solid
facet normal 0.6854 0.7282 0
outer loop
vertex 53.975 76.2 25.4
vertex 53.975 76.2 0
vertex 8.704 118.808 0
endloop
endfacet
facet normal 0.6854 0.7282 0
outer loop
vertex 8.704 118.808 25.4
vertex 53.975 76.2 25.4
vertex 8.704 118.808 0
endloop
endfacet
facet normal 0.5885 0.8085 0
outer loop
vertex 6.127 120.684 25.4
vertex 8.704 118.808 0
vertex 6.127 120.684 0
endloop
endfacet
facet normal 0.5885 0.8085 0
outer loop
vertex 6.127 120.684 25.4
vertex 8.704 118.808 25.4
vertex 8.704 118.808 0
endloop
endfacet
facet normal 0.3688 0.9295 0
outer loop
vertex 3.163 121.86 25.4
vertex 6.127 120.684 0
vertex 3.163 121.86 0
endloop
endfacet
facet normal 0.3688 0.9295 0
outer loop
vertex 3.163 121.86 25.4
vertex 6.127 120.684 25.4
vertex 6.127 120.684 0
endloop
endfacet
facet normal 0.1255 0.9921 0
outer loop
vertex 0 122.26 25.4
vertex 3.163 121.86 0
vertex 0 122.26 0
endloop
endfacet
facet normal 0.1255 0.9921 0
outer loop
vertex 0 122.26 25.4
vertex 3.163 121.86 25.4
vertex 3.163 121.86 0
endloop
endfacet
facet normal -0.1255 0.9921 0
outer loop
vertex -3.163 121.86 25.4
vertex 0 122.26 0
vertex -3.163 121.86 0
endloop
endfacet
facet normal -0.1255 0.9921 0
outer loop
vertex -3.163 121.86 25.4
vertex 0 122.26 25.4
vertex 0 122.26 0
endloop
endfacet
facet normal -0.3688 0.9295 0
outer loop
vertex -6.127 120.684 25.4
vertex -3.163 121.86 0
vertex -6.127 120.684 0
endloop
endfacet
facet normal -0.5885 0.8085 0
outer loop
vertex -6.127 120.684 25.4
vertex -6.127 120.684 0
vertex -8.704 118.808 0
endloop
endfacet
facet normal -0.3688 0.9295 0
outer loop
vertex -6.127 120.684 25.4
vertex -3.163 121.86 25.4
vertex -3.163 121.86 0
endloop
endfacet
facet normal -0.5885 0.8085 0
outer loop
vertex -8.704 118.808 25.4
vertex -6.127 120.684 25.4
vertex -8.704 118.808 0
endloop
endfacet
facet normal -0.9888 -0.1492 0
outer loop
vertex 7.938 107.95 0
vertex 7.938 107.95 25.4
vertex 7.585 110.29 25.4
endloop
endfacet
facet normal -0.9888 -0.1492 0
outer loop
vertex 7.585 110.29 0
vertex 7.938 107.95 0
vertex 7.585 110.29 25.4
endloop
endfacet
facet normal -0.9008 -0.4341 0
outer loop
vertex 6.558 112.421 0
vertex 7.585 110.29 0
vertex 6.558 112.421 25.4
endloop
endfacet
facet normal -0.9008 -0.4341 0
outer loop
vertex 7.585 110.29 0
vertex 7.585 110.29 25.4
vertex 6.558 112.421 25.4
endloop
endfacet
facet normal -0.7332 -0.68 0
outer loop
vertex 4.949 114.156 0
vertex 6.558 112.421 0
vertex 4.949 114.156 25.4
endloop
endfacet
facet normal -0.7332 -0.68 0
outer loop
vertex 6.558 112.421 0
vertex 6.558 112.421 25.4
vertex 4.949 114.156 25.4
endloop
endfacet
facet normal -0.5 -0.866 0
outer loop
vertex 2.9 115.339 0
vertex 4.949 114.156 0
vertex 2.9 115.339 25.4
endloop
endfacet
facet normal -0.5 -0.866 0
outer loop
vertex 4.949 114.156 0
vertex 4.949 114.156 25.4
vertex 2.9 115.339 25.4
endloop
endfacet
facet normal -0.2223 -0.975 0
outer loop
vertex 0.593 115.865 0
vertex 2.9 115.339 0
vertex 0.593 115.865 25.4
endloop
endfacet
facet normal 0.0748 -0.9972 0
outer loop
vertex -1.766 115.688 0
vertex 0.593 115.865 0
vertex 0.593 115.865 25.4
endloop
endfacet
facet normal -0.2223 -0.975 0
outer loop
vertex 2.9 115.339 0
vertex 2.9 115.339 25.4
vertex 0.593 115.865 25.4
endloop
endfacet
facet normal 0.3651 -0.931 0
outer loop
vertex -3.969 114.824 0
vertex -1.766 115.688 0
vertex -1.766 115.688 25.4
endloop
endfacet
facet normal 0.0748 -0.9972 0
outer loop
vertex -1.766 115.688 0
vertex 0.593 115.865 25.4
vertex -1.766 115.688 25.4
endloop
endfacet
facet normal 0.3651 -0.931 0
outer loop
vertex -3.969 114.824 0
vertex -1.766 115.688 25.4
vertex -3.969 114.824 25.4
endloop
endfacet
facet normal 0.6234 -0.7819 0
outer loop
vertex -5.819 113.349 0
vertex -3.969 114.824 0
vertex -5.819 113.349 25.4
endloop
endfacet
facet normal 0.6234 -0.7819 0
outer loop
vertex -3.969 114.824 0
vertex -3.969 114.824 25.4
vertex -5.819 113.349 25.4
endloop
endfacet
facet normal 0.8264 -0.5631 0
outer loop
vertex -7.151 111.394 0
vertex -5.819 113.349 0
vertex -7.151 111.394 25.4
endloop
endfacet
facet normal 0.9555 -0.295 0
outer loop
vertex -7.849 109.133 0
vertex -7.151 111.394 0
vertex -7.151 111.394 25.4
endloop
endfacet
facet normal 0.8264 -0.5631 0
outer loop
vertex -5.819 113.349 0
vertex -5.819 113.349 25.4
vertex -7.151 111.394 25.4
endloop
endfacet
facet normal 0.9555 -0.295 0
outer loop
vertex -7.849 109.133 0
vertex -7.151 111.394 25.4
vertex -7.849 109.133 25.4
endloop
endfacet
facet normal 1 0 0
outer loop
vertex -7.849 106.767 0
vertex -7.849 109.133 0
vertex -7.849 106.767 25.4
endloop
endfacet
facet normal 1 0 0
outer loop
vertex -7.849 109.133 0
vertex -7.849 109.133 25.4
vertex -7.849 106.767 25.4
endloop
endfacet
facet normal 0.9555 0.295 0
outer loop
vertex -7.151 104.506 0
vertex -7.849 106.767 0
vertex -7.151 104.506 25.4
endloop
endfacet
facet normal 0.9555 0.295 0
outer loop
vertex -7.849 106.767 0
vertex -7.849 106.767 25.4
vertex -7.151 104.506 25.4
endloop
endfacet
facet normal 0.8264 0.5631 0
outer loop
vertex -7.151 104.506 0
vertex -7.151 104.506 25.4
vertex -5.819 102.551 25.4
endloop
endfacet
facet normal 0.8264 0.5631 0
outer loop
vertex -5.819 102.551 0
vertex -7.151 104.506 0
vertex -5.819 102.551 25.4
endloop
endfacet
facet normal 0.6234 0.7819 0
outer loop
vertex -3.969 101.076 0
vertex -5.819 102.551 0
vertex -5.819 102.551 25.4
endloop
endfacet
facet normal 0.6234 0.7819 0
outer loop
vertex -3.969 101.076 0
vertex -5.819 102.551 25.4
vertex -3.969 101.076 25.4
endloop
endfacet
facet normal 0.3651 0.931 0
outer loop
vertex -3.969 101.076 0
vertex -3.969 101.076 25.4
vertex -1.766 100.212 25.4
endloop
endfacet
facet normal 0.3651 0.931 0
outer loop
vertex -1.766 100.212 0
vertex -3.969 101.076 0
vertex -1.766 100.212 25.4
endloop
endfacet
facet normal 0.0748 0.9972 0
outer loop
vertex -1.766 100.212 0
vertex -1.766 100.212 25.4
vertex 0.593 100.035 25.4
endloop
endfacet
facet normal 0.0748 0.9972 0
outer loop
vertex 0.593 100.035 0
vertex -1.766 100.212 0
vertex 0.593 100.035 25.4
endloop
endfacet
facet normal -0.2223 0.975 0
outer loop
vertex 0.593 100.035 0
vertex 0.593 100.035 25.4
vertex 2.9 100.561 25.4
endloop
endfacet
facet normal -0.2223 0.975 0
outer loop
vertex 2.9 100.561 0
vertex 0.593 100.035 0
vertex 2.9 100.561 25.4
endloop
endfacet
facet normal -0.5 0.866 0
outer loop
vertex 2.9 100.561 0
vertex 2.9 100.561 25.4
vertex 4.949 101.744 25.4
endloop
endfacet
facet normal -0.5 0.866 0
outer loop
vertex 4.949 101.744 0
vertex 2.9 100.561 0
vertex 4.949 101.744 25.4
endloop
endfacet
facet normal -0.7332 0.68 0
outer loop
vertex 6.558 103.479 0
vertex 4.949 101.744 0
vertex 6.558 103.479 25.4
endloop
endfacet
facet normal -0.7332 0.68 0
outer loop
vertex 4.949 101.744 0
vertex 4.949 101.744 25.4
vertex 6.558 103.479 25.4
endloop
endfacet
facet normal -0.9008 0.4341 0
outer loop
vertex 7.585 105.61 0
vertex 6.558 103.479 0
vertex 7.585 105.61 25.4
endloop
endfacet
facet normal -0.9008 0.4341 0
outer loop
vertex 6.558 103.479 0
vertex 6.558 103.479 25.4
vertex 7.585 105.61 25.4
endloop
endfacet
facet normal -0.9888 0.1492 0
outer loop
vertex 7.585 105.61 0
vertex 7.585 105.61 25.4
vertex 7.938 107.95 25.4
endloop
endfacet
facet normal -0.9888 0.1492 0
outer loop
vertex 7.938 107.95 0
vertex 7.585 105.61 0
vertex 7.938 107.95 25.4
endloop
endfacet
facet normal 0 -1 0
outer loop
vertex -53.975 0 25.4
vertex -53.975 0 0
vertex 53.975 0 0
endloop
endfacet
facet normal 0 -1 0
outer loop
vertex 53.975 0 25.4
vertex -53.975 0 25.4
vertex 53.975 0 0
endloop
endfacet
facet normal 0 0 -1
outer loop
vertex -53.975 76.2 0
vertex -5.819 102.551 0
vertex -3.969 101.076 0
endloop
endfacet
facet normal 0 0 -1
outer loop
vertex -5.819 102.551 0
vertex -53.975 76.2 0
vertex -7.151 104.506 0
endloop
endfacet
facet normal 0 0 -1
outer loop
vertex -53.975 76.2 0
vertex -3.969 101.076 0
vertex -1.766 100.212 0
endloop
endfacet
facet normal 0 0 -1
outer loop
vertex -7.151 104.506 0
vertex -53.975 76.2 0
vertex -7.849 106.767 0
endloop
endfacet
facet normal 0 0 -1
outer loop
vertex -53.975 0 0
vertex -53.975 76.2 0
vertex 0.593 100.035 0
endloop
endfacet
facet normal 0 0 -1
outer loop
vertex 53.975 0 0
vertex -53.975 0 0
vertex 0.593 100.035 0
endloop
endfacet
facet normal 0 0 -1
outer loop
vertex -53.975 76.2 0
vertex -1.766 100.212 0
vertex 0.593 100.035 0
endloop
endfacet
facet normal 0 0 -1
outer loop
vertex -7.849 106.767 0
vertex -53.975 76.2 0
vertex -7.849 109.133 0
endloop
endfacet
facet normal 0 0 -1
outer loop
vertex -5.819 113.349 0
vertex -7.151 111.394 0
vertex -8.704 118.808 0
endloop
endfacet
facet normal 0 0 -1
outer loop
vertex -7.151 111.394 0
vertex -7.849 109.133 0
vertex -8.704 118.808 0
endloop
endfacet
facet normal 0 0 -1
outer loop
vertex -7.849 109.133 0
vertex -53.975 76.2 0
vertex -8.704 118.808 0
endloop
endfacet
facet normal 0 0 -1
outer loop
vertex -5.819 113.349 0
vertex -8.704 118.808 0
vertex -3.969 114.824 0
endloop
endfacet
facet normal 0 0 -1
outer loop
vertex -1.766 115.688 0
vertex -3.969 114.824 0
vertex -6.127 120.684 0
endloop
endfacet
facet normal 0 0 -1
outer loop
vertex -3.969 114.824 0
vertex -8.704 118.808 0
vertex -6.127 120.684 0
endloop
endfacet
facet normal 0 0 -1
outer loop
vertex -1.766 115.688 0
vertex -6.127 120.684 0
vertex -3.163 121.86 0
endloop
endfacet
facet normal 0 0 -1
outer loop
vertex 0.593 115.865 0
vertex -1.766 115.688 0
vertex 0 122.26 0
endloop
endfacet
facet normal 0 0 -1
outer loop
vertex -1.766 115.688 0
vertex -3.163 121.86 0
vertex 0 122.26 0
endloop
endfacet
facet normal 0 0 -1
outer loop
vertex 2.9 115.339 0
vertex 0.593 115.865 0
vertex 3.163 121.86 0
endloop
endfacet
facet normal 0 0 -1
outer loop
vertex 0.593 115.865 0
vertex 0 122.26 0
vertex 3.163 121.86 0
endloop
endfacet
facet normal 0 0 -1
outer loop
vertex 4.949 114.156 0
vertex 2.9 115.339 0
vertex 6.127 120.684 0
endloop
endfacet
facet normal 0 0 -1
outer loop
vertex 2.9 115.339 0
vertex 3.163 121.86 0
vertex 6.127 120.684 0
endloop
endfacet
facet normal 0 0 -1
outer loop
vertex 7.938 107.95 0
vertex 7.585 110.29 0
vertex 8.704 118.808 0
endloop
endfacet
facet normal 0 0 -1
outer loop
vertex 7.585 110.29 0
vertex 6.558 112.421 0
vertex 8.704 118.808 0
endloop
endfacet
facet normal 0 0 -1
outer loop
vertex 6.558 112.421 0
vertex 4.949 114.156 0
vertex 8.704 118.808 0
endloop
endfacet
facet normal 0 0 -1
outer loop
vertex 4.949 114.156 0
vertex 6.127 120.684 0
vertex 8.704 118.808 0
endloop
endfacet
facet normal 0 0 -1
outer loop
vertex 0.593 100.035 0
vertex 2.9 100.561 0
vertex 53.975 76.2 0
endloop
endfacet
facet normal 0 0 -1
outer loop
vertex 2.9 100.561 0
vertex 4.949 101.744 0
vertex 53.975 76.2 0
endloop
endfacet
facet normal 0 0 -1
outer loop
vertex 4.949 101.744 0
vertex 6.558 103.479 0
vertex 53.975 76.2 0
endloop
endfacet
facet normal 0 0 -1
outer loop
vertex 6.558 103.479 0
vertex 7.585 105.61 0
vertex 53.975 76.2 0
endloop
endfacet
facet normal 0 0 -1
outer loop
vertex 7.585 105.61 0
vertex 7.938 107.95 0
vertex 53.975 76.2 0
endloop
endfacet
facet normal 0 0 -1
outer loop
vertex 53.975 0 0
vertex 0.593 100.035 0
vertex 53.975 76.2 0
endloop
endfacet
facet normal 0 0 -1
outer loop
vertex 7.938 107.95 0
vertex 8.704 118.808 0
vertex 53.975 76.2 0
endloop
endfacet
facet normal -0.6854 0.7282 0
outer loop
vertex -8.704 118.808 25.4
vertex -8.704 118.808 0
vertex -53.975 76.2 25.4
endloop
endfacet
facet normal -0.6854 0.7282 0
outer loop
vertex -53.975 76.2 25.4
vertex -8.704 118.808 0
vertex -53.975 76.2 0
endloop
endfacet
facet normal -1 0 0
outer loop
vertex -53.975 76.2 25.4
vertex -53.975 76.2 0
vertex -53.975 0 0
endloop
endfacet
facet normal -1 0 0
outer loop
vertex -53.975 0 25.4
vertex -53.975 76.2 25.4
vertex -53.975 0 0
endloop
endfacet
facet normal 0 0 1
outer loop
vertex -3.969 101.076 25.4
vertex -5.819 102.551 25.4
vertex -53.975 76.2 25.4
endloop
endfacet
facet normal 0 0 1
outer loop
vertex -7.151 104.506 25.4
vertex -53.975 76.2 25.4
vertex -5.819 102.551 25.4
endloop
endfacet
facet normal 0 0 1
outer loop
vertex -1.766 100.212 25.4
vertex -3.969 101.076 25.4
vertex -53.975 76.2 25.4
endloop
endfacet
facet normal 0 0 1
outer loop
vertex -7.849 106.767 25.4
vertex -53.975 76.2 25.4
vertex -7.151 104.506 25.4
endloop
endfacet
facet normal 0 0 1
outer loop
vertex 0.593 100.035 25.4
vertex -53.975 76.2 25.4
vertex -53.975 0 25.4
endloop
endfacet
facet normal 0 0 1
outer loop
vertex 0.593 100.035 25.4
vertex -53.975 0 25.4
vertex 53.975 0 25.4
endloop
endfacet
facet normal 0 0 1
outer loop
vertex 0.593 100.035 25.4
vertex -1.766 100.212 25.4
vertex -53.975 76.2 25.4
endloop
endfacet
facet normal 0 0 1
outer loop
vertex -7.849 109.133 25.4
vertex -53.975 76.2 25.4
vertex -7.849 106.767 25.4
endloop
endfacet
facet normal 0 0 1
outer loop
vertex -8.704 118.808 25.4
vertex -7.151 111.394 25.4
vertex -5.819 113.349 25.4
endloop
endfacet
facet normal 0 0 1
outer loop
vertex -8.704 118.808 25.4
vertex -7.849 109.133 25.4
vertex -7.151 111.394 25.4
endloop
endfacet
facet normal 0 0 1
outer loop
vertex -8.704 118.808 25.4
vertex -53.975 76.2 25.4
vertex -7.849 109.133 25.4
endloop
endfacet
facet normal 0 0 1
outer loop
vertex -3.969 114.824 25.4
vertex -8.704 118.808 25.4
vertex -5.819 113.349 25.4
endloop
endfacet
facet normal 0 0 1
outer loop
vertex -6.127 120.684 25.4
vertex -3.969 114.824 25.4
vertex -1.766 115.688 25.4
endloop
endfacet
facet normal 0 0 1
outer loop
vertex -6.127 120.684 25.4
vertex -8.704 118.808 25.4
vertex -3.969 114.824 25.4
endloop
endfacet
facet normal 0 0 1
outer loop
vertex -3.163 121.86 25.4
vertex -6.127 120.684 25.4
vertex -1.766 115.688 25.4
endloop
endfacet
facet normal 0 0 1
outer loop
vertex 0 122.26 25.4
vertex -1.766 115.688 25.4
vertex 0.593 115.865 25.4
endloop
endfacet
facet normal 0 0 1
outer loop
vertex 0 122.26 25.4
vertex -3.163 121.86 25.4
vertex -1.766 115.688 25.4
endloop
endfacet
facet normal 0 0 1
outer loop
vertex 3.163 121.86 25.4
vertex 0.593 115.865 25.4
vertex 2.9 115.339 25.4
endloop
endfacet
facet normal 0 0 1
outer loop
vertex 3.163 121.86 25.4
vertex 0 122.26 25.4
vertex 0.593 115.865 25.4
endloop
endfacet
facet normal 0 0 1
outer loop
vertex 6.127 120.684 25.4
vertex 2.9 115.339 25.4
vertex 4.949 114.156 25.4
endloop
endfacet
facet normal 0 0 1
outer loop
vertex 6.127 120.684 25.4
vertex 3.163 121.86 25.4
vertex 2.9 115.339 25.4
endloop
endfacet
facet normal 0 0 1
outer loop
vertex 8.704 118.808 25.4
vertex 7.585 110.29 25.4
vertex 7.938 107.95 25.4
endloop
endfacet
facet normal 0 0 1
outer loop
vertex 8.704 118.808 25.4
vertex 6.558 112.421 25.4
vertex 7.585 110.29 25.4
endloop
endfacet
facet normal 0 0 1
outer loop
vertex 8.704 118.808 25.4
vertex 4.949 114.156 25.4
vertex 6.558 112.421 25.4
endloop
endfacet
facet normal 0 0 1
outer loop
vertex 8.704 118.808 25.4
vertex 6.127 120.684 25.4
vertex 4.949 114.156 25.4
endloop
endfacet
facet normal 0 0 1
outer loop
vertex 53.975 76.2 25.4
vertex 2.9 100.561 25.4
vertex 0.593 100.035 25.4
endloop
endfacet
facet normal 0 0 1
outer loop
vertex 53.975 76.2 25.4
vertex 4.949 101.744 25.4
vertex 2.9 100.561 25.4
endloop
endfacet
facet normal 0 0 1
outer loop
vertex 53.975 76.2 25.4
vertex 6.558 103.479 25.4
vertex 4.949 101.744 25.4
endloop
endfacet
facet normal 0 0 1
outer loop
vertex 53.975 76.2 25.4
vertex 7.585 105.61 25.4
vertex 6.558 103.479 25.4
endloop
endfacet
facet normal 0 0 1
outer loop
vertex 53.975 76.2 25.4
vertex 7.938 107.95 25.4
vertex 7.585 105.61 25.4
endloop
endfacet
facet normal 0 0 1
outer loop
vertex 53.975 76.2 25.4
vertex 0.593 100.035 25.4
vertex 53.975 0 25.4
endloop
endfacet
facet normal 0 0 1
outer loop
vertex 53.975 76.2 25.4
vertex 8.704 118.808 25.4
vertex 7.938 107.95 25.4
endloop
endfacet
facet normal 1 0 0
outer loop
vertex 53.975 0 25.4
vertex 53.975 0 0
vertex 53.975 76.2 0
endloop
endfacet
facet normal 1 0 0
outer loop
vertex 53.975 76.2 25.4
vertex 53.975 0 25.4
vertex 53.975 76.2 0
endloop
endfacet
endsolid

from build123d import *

# Parameters (mm, degrees)
BOSS_EXTRUDE1_DEPTH = 25.4
FILLET1_R           = 12.7
SKETCH2_R           = 7.9375
CUT_EXTRUDE1_DEPTH  = 25.4


with BuildPart() as part:
    # Sketch1 → Boss-Extrude1 (new body)
    with BuildSketch(Plane.XY):
        Polygon((-53.975, 0), (53.975, 0), (53.975, 76.2), (0, 127), (-53.975, 76.2), align=None)
    extrude(amount=BOSS_EXTRUDE1_DEPTH)

    # Fillet1
    fillet1_edges = [part.edges().sort_by_distance(p)[0] for p in [
        (0, 127, 12.7),
    ]]
    fillet(fillet1_edges, radius=FILLET1_R)

    # Sketch2 → Cut-Extrude1 (cut)
    with BuildSketch(Plane.XY.offset(25.4)):
        with Locations((0, 107.95)):
            Circle(SKETCH2_R)
    extrude(amount=-CUT_EXTRUDE1_DEPTH, mode=Mode.SUBTRACT)


solid = part.part
